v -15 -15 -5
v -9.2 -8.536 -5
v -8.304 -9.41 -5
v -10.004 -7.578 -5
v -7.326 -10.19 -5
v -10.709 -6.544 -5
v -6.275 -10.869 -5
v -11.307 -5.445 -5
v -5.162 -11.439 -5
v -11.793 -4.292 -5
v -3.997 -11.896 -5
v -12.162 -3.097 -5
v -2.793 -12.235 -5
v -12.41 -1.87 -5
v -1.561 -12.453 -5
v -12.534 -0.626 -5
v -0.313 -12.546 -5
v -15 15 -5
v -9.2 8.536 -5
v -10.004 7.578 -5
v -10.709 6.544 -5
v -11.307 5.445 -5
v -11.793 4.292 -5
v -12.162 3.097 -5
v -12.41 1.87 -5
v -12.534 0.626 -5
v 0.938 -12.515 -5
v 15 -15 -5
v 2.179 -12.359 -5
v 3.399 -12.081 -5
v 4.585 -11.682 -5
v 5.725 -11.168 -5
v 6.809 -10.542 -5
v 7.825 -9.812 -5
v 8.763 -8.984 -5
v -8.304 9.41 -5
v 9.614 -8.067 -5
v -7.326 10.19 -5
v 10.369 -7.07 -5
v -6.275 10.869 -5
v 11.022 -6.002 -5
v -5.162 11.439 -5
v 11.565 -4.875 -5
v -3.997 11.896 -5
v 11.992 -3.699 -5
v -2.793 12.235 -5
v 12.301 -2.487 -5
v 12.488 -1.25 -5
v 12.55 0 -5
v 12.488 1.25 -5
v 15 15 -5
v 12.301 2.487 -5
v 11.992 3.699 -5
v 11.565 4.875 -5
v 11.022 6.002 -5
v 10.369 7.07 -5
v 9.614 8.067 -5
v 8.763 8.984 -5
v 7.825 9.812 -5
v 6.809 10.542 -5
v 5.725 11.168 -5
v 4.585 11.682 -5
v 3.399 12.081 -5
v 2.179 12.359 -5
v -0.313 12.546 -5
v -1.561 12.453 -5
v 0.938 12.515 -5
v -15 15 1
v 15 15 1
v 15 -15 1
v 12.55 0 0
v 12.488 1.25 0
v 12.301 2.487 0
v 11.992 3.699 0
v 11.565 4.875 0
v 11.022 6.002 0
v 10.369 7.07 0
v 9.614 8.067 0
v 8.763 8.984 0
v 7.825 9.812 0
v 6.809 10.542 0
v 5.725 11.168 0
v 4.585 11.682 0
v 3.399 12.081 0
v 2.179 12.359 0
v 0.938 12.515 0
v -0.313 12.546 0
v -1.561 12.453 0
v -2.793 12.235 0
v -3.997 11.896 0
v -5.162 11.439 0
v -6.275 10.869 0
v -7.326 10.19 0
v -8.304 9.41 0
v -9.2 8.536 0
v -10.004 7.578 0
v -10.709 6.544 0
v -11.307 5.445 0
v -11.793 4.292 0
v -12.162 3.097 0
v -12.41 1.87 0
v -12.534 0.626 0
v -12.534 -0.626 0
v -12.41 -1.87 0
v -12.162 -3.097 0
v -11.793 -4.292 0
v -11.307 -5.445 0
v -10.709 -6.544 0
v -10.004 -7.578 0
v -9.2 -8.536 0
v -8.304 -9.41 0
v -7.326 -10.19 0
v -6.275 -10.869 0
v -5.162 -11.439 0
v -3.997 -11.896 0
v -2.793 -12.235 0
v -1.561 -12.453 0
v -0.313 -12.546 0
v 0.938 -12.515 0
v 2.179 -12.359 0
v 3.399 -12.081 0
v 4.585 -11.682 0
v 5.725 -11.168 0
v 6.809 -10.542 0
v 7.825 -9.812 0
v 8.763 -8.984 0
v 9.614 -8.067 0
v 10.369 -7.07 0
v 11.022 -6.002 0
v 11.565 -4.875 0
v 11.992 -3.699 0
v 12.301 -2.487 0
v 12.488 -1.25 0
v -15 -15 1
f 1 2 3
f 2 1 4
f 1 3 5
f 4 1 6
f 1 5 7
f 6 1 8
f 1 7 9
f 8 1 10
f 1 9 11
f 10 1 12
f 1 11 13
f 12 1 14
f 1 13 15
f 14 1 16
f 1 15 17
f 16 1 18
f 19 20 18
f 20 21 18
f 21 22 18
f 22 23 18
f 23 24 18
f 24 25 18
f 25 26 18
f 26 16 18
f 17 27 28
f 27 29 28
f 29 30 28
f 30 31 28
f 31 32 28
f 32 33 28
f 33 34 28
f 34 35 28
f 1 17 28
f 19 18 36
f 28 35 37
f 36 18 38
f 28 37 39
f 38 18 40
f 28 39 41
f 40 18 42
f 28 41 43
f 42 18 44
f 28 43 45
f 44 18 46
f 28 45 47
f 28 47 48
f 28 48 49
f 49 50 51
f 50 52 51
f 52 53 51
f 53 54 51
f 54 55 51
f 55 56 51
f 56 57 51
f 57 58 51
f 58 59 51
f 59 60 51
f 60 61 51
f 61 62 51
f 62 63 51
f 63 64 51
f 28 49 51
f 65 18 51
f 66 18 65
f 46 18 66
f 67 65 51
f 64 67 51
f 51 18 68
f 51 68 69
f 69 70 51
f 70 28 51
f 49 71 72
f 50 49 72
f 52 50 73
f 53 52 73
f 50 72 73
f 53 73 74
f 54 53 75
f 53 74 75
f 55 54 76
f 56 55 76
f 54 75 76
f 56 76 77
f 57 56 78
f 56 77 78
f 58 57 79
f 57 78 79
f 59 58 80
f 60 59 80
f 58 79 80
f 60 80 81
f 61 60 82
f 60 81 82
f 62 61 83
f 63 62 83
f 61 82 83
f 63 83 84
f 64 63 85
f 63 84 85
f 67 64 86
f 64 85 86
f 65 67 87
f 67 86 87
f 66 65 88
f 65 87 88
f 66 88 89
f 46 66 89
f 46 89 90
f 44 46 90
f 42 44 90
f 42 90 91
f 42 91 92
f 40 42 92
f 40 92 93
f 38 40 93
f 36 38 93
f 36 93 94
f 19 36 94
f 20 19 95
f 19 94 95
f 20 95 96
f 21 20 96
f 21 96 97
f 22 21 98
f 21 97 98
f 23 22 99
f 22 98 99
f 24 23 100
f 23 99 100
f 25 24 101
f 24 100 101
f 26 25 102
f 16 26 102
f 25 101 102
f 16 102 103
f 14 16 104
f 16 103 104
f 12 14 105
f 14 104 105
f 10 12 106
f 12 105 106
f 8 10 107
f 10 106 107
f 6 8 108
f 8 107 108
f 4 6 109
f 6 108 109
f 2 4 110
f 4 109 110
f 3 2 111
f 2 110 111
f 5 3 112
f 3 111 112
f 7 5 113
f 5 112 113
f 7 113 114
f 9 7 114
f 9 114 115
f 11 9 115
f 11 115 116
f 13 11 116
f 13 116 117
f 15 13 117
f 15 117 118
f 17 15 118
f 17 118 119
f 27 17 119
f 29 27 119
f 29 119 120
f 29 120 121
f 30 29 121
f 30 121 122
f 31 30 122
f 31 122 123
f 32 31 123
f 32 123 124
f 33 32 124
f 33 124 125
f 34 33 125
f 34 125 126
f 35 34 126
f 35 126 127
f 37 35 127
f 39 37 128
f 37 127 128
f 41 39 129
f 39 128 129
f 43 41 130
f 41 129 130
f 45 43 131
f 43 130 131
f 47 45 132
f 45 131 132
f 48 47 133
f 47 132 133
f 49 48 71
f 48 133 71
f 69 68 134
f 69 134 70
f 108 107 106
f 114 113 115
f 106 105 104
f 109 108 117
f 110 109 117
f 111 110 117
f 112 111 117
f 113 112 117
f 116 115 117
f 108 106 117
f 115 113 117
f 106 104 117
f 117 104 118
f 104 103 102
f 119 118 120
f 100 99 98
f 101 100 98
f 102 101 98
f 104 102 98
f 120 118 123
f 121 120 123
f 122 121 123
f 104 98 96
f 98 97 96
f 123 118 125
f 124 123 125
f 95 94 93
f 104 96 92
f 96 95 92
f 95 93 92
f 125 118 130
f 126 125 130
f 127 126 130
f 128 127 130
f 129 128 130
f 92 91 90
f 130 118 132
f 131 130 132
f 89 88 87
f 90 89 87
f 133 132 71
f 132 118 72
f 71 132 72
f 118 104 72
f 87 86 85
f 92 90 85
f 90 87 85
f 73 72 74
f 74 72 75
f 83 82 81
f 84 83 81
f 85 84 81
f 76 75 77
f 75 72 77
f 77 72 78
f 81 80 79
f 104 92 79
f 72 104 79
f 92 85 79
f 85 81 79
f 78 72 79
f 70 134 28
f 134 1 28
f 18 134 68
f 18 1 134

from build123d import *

# Parameters (mm, degrees)
SKETCH2_W           = 30
SKETCH2_H           = 30
SKETCH2_R           = 12.55
BOSS_EXTRUDE1_DEPTH = 5
SKETCH4_W           = 30
SKETCH4_H           = 30
BOSS_EXTRUDE2_DEPTH = 1


with BuildPart() as part:
    # Sketch2 → Boss-Extrude1 (new body)
    with BuildSketch(Plane.XY):
        Rectangle(SKETCH2_W, SKETCH2_H)
        Circle(SKETCH2_R, mode=Mode.SUBTRACT)
    extrude(amount=-BOSS_EXTRUDE1_DEPTH)

    # Sketch4 → Boss-Extrude2 (add)
    with BuildSketch(Plane.XY):
        Rectangle(SKETCH4_W, SKETCH4_H)
    extrude(amount=BOSS_EXTRUDE2_DEPTH)


solid = part.part
